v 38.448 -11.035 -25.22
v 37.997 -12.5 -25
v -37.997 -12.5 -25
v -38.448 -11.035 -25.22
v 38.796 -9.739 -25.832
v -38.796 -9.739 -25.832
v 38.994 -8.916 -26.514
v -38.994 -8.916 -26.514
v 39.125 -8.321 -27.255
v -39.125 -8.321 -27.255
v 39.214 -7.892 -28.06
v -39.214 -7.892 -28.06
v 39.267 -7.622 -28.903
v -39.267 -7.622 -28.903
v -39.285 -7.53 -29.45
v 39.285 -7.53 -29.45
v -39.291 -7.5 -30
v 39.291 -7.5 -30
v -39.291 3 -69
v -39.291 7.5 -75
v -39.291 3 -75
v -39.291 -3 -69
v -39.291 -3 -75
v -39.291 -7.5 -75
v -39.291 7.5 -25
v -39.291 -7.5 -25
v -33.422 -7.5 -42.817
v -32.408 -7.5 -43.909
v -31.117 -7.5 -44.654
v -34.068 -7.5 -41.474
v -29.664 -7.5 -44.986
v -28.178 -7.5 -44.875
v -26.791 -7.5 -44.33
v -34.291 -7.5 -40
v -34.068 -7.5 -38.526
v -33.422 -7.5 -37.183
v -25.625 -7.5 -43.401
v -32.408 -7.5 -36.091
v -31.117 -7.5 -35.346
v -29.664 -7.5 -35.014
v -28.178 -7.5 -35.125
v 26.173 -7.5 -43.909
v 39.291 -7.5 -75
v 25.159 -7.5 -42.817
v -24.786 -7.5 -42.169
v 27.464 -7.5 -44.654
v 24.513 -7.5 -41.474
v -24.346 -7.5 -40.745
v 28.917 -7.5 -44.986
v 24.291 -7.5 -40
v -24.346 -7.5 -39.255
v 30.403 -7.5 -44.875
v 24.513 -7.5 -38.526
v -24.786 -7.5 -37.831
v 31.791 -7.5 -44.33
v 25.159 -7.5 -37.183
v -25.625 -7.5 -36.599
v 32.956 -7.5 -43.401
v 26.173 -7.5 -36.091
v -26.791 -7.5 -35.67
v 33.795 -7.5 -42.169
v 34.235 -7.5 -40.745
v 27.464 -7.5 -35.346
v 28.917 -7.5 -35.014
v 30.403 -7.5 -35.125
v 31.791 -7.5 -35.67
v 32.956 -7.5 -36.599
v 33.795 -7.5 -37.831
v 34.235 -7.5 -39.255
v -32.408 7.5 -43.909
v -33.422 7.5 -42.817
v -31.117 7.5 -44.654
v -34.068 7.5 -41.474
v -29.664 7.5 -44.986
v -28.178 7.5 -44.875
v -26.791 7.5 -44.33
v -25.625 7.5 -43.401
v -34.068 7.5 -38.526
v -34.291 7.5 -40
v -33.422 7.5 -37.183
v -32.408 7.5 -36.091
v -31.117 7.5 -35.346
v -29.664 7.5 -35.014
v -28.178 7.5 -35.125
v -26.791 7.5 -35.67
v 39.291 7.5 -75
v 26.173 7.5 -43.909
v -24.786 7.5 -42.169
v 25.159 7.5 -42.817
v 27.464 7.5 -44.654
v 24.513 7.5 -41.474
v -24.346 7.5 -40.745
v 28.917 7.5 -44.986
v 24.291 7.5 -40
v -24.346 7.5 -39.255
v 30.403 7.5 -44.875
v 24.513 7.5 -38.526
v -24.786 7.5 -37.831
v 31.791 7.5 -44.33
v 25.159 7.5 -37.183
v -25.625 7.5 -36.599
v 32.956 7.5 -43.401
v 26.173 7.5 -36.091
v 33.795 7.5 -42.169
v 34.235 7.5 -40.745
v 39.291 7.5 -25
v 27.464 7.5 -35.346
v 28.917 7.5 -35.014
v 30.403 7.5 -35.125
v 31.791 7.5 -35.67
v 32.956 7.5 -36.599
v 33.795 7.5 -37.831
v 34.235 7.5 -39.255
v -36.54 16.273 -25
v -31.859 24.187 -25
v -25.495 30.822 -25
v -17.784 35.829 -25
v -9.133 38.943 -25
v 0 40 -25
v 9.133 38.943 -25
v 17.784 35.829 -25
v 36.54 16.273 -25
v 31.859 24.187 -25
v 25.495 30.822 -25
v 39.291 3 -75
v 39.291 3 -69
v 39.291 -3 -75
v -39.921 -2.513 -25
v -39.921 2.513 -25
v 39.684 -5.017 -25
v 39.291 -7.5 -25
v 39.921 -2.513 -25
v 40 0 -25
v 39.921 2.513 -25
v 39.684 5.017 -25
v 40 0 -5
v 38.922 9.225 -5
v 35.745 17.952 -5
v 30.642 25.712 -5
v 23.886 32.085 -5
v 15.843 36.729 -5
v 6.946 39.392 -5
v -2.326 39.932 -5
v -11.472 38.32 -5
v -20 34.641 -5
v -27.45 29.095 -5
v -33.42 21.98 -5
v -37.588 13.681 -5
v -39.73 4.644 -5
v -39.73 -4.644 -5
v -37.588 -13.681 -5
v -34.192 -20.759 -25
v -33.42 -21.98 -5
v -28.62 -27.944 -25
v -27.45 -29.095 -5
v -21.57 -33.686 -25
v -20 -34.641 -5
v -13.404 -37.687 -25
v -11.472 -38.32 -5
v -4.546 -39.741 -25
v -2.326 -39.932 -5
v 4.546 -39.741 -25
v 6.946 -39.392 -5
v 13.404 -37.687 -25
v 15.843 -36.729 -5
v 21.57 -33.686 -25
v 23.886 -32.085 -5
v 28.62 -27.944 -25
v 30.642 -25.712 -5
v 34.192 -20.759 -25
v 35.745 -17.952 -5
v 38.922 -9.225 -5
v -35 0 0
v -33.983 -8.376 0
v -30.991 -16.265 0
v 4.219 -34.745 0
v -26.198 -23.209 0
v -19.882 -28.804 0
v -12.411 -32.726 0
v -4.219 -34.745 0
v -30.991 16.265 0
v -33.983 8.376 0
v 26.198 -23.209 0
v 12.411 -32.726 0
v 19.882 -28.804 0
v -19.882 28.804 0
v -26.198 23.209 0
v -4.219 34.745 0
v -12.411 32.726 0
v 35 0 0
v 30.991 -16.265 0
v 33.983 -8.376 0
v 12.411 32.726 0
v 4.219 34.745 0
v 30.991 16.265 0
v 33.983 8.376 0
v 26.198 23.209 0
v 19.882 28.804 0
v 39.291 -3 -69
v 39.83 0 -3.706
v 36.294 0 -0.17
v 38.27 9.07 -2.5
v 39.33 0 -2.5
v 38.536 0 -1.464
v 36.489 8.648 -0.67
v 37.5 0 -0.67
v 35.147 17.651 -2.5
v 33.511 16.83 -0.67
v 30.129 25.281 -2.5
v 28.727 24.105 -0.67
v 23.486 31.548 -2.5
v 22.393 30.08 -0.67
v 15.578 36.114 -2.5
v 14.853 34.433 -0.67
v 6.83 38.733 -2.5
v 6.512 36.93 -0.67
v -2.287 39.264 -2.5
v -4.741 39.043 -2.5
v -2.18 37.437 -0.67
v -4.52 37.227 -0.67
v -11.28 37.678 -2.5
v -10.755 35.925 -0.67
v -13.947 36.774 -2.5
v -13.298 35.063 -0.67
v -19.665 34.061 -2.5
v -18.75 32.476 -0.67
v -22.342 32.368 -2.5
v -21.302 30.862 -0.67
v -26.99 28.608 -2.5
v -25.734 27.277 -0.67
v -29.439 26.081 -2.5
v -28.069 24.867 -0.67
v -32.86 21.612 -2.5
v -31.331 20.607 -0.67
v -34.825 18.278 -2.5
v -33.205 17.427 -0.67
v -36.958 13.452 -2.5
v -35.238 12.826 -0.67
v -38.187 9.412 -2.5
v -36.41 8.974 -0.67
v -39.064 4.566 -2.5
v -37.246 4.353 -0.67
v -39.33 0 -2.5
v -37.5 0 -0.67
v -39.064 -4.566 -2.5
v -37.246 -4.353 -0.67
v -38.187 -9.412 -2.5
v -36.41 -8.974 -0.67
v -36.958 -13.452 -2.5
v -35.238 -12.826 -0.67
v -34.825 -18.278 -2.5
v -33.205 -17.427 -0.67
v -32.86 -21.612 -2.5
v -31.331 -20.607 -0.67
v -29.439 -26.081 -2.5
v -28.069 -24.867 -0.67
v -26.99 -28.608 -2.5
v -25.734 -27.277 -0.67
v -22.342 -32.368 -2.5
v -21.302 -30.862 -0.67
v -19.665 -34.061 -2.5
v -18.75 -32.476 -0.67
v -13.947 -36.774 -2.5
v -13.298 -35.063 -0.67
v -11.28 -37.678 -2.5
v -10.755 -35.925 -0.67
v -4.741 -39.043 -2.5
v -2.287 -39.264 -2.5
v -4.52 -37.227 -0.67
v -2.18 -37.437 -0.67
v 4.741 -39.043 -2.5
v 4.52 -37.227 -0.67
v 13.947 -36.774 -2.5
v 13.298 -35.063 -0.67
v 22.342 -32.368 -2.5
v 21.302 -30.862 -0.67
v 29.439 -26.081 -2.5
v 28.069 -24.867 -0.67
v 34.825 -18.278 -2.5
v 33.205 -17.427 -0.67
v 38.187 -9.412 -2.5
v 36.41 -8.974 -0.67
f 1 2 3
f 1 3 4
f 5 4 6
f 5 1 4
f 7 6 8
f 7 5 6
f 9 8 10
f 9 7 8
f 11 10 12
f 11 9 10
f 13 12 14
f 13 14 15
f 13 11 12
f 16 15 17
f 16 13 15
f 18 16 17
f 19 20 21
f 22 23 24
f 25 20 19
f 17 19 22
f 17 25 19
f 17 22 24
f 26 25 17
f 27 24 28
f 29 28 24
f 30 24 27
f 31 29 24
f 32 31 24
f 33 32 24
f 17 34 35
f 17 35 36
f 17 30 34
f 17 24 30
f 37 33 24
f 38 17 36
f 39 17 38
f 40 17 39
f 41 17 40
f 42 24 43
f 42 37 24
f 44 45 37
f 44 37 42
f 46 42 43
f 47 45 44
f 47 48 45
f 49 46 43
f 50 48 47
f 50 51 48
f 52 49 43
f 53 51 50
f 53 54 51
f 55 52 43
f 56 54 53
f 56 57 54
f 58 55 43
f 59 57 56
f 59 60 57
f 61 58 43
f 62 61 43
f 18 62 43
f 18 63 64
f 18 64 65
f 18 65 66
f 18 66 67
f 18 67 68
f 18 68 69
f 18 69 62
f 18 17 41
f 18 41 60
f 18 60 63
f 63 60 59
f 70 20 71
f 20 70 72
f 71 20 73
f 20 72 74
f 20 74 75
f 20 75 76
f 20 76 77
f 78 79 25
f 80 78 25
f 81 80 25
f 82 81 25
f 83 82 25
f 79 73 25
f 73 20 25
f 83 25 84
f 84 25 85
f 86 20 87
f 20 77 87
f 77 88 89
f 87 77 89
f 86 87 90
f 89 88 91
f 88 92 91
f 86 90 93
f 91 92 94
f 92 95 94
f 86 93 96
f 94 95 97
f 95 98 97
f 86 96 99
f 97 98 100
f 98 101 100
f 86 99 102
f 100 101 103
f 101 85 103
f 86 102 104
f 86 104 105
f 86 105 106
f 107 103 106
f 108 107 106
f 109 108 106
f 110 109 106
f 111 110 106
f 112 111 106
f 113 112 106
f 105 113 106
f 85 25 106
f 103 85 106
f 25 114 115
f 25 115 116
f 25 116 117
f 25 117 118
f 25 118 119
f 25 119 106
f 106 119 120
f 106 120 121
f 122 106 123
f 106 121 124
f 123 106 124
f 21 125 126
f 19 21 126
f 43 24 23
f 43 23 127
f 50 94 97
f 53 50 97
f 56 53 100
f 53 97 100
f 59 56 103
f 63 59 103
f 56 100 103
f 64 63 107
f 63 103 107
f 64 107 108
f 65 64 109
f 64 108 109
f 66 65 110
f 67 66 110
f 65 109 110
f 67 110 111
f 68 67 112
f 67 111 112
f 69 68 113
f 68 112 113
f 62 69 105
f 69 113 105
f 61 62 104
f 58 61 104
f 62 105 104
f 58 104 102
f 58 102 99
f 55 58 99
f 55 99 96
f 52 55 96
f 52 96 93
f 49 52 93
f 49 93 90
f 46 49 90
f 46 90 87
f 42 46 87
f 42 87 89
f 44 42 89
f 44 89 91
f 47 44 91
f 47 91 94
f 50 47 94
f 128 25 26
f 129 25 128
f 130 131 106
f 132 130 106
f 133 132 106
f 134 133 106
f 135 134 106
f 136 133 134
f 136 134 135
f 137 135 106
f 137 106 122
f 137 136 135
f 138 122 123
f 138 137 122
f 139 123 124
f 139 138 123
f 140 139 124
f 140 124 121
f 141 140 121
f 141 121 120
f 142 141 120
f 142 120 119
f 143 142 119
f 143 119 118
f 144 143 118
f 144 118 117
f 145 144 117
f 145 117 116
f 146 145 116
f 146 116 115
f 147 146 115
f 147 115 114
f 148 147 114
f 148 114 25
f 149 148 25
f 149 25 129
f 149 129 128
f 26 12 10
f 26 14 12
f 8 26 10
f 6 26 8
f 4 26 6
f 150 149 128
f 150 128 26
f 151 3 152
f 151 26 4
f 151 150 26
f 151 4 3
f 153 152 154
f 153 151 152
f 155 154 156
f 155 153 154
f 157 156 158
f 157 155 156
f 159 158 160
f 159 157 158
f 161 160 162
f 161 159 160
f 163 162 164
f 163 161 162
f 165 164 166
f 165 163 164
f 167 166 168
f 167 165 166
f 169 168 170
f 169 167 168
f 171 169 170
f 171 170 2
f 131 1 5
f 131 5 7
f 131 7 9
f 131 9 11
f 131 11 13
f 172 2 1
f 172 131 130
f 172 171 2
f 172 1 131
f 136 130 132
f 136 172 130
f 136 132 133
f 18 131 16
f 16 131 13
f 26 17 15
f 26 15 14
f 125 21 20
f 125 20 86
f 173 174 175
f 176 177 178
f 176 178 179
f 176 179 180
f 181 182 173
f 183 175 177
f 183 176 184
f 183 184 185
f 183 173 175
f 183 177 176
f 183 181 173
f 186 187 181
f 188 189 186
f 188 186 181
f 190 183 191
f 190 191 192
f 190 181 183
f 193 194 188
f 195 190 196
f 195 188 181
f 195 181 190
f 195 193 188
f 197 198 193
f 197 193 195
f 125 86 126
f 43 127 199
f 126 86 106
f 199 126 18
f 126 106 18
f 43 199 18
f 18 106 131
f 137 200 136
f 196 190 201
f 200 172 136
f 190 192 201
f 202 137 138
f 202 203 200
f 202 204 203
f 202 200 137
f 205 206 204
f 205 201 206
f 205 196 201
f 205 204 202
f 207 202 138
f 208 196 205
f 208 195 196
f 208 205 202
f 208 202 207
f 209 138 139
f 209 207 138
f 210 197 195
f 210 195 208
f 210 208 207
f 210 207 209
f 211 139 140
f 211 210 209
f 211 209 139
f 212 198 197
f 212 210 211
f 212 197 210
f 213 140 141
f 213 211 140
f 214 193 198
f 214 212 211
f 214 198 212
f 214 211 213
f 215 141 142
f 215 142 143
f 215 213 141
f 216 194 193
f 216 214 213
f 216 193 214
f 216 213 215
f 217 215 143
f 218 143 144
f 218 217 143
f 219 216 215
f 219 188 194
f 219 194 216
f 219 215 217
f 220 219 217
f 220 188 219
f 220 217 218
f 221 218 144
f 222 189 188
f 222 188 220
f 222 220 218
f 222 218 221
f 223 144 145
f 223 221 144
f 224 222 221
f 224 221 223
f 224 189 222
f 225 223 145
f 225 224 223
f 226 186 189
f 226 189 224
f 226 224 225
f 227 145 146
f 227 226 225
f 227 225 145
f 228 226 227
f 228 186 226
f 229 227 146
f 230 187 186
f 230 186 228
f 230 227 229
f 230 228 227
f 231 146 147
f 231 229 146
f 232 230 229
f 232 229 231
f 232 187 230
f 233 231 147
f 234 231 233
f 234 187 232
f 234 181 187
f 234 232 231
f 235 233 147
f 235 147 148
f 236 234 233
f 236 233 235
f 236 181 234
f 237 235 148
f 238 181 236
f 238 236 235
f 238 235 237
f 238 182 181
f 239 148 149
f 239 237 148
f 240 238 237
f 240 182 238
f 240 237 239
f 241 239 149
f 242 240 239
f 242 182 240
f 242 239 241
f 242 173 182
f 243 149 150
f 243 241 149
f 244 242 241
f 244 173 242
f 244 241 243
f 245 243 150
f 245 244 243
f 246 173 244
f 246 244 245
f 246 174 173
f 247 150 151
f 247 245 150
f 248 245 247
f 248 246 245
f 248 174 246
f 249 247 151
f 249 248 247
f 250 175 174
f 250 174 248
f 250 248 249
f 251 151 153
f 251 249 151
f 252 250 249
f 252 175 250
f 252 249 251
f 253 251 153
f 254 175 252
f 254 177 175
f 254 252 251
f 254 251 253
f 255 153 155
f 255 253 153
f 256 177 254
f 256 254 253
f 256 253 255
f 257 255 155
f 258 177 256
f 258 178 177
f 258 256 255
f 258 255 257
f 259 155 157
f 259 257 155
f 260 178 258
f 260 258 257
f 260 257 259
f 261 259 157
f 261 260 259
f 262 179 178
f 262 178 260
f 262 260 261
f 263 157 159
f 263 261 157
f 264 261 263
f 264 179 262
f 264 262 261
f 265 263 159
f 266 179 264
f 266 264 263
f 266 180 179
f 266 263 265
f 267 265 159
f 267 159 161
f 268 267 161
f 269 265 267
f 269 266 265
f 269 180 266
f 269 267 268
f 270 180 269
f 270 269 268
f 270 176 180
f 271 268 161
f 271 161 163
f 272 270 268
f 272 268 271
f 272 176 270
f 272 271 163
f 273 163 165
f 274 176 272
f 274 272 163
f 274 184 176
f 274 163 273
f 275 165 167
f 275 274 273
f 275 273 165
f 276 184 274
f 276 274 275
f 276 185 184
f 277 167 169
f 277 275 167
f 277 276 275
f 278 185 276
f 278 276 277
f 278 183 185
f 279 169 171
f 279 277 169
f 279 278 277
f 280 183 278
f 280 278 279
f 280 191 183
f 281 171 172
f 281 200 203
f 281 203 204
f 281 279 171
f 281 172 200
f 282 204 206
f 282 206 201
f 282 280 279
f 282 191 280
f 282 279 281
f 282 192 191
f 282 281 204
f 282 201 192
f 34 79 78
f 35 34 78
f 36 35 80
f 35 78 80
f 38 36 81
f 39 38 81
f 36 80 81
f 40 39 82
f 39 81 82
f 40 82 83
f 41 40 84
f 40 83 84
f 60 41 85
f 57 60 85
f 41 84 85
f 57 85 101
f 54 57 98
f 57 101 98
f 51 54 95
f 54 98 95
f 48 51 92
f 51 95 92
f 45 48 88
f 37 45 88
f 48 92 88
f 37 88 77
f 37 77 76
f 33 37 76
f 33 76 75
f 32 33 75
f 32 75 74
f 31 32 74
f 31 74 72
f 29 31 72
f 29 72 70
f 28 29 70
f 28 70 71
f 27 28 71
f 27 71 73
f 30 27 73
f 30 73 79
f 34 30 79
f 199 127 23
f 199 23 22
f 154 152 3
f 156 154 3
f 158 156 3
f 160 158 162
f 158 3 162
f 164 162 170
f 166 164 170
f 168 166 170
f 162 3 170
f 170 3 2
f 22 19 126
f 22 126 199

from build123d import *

# Parameters (mm, degrees)
F0_R        = 40
F1_DEPTH    = 25
F2_W        = 78.5811682275
F2_H        = 15
F3_DEPTH    = 50
F4_W        = 6
F4_H        = 12
F5_DEPTH    = 79.2915841138
F6_R        = 5
F7_DEPTH    = 25
F8_T4_DEPTH = 78.5811682275
F8_S5_R     = 40
F8_T6_DEPTH = 41


# Not quite as in the source:
# - a fillet or chamfer that OpenCascade refuses, or shapes differently, is made with other operations: its cross-section is extruded or revolved along the edge and cut away or added


with BuildPart() as f1:
    # F0 (on Top) → F1 (new body)
    with BuildSketch(Plane.XY):
        Circle(F0_R)
    extrude(amount=-F1_DEPTH)

    # F2 (on face) → F3 (join)
    with BuildSketch(Plane(origin=(0, 0, -25), x_dir=(1, 0, 0), z_dir=(0, 0, -1))):
        Rectangle(F2_W, F2_H)
    extrude(amount=F3_DEPTH)

    # F4 (on face) → F5 (cut, through all)
    with BuildSketch(Plane(origin=(-39.2905841138, 0, 0), x_dir=(0, -1, 0), z_dir=(-1, 0, 0))):
        with Locations((0, -75)):
            Rectangle(F4_W, F4_H)
    extrude(amount=-F5_DEPTH, mode=Mode.SUBTRACT)

    # F6 (on face) → F7 (cut)
    with BuildSketch(Plane(origin=(0, 7.5, 0), x_dir=(-1, 0, 0), z_dir=(0, 1, 0))):
        with Locations((-29.2905841138, -40)):
            Circle(F6_R)
        with Locations((29.2905841138, -40)):
            Circle(F6_R)
    extrude(amount=-F7_DEPTH, mode=Mode.SUBTRACT)

    # F8: fillet of radius 5 on 2 edges, made by hand


with BuildPart() as f8_tool2:
    # F8_s3 → F8_t4 (new body)
    with BuildSketch(Plane.YZ.offset(39.2905841138)):
        with BuildLine():
            ThreePointArc((-12.5, -25), (-8.9644660941, -26.4644660941), (-7.5, -30))
            Line((-7.5, -30), (-7.5, -25))
            Line((-7.5, -25), (-12.5, -25))
        make_face()
    extrude(amount=-F8_T4_DEPTH)

    # F8_s5 → F8_t6 (intersect, symmetric)
    with BuildSketch(Plane.XY.offset(-27.5)):
        Circle(F8_S5_R)
    extrude(amount=F8_T6_DEPTH, both=True, mode=Mode.INTERSECT)


with BuildPart() as f1_1:
    add(f1.part)

    # F8_t1: union F8_tool2
    add(f8_tool2.part)

    # F8_s7 → F8_t8 (revolve, cut)
    with BuildSketch(Plane.XZ):
        with BuildLine():
            ThreePointArc((40, -5), (38.5355339059, -1.4644660941), (35, 0))
            Line((35, 0), (40, 0))
            Line((40, 0), (40, -5))
        make_face()
    revolve(axis=Axis((0, 0, 0), (0, 0, 1)), mode=Mode.SUBTRACT)


solid = f1_1.part
